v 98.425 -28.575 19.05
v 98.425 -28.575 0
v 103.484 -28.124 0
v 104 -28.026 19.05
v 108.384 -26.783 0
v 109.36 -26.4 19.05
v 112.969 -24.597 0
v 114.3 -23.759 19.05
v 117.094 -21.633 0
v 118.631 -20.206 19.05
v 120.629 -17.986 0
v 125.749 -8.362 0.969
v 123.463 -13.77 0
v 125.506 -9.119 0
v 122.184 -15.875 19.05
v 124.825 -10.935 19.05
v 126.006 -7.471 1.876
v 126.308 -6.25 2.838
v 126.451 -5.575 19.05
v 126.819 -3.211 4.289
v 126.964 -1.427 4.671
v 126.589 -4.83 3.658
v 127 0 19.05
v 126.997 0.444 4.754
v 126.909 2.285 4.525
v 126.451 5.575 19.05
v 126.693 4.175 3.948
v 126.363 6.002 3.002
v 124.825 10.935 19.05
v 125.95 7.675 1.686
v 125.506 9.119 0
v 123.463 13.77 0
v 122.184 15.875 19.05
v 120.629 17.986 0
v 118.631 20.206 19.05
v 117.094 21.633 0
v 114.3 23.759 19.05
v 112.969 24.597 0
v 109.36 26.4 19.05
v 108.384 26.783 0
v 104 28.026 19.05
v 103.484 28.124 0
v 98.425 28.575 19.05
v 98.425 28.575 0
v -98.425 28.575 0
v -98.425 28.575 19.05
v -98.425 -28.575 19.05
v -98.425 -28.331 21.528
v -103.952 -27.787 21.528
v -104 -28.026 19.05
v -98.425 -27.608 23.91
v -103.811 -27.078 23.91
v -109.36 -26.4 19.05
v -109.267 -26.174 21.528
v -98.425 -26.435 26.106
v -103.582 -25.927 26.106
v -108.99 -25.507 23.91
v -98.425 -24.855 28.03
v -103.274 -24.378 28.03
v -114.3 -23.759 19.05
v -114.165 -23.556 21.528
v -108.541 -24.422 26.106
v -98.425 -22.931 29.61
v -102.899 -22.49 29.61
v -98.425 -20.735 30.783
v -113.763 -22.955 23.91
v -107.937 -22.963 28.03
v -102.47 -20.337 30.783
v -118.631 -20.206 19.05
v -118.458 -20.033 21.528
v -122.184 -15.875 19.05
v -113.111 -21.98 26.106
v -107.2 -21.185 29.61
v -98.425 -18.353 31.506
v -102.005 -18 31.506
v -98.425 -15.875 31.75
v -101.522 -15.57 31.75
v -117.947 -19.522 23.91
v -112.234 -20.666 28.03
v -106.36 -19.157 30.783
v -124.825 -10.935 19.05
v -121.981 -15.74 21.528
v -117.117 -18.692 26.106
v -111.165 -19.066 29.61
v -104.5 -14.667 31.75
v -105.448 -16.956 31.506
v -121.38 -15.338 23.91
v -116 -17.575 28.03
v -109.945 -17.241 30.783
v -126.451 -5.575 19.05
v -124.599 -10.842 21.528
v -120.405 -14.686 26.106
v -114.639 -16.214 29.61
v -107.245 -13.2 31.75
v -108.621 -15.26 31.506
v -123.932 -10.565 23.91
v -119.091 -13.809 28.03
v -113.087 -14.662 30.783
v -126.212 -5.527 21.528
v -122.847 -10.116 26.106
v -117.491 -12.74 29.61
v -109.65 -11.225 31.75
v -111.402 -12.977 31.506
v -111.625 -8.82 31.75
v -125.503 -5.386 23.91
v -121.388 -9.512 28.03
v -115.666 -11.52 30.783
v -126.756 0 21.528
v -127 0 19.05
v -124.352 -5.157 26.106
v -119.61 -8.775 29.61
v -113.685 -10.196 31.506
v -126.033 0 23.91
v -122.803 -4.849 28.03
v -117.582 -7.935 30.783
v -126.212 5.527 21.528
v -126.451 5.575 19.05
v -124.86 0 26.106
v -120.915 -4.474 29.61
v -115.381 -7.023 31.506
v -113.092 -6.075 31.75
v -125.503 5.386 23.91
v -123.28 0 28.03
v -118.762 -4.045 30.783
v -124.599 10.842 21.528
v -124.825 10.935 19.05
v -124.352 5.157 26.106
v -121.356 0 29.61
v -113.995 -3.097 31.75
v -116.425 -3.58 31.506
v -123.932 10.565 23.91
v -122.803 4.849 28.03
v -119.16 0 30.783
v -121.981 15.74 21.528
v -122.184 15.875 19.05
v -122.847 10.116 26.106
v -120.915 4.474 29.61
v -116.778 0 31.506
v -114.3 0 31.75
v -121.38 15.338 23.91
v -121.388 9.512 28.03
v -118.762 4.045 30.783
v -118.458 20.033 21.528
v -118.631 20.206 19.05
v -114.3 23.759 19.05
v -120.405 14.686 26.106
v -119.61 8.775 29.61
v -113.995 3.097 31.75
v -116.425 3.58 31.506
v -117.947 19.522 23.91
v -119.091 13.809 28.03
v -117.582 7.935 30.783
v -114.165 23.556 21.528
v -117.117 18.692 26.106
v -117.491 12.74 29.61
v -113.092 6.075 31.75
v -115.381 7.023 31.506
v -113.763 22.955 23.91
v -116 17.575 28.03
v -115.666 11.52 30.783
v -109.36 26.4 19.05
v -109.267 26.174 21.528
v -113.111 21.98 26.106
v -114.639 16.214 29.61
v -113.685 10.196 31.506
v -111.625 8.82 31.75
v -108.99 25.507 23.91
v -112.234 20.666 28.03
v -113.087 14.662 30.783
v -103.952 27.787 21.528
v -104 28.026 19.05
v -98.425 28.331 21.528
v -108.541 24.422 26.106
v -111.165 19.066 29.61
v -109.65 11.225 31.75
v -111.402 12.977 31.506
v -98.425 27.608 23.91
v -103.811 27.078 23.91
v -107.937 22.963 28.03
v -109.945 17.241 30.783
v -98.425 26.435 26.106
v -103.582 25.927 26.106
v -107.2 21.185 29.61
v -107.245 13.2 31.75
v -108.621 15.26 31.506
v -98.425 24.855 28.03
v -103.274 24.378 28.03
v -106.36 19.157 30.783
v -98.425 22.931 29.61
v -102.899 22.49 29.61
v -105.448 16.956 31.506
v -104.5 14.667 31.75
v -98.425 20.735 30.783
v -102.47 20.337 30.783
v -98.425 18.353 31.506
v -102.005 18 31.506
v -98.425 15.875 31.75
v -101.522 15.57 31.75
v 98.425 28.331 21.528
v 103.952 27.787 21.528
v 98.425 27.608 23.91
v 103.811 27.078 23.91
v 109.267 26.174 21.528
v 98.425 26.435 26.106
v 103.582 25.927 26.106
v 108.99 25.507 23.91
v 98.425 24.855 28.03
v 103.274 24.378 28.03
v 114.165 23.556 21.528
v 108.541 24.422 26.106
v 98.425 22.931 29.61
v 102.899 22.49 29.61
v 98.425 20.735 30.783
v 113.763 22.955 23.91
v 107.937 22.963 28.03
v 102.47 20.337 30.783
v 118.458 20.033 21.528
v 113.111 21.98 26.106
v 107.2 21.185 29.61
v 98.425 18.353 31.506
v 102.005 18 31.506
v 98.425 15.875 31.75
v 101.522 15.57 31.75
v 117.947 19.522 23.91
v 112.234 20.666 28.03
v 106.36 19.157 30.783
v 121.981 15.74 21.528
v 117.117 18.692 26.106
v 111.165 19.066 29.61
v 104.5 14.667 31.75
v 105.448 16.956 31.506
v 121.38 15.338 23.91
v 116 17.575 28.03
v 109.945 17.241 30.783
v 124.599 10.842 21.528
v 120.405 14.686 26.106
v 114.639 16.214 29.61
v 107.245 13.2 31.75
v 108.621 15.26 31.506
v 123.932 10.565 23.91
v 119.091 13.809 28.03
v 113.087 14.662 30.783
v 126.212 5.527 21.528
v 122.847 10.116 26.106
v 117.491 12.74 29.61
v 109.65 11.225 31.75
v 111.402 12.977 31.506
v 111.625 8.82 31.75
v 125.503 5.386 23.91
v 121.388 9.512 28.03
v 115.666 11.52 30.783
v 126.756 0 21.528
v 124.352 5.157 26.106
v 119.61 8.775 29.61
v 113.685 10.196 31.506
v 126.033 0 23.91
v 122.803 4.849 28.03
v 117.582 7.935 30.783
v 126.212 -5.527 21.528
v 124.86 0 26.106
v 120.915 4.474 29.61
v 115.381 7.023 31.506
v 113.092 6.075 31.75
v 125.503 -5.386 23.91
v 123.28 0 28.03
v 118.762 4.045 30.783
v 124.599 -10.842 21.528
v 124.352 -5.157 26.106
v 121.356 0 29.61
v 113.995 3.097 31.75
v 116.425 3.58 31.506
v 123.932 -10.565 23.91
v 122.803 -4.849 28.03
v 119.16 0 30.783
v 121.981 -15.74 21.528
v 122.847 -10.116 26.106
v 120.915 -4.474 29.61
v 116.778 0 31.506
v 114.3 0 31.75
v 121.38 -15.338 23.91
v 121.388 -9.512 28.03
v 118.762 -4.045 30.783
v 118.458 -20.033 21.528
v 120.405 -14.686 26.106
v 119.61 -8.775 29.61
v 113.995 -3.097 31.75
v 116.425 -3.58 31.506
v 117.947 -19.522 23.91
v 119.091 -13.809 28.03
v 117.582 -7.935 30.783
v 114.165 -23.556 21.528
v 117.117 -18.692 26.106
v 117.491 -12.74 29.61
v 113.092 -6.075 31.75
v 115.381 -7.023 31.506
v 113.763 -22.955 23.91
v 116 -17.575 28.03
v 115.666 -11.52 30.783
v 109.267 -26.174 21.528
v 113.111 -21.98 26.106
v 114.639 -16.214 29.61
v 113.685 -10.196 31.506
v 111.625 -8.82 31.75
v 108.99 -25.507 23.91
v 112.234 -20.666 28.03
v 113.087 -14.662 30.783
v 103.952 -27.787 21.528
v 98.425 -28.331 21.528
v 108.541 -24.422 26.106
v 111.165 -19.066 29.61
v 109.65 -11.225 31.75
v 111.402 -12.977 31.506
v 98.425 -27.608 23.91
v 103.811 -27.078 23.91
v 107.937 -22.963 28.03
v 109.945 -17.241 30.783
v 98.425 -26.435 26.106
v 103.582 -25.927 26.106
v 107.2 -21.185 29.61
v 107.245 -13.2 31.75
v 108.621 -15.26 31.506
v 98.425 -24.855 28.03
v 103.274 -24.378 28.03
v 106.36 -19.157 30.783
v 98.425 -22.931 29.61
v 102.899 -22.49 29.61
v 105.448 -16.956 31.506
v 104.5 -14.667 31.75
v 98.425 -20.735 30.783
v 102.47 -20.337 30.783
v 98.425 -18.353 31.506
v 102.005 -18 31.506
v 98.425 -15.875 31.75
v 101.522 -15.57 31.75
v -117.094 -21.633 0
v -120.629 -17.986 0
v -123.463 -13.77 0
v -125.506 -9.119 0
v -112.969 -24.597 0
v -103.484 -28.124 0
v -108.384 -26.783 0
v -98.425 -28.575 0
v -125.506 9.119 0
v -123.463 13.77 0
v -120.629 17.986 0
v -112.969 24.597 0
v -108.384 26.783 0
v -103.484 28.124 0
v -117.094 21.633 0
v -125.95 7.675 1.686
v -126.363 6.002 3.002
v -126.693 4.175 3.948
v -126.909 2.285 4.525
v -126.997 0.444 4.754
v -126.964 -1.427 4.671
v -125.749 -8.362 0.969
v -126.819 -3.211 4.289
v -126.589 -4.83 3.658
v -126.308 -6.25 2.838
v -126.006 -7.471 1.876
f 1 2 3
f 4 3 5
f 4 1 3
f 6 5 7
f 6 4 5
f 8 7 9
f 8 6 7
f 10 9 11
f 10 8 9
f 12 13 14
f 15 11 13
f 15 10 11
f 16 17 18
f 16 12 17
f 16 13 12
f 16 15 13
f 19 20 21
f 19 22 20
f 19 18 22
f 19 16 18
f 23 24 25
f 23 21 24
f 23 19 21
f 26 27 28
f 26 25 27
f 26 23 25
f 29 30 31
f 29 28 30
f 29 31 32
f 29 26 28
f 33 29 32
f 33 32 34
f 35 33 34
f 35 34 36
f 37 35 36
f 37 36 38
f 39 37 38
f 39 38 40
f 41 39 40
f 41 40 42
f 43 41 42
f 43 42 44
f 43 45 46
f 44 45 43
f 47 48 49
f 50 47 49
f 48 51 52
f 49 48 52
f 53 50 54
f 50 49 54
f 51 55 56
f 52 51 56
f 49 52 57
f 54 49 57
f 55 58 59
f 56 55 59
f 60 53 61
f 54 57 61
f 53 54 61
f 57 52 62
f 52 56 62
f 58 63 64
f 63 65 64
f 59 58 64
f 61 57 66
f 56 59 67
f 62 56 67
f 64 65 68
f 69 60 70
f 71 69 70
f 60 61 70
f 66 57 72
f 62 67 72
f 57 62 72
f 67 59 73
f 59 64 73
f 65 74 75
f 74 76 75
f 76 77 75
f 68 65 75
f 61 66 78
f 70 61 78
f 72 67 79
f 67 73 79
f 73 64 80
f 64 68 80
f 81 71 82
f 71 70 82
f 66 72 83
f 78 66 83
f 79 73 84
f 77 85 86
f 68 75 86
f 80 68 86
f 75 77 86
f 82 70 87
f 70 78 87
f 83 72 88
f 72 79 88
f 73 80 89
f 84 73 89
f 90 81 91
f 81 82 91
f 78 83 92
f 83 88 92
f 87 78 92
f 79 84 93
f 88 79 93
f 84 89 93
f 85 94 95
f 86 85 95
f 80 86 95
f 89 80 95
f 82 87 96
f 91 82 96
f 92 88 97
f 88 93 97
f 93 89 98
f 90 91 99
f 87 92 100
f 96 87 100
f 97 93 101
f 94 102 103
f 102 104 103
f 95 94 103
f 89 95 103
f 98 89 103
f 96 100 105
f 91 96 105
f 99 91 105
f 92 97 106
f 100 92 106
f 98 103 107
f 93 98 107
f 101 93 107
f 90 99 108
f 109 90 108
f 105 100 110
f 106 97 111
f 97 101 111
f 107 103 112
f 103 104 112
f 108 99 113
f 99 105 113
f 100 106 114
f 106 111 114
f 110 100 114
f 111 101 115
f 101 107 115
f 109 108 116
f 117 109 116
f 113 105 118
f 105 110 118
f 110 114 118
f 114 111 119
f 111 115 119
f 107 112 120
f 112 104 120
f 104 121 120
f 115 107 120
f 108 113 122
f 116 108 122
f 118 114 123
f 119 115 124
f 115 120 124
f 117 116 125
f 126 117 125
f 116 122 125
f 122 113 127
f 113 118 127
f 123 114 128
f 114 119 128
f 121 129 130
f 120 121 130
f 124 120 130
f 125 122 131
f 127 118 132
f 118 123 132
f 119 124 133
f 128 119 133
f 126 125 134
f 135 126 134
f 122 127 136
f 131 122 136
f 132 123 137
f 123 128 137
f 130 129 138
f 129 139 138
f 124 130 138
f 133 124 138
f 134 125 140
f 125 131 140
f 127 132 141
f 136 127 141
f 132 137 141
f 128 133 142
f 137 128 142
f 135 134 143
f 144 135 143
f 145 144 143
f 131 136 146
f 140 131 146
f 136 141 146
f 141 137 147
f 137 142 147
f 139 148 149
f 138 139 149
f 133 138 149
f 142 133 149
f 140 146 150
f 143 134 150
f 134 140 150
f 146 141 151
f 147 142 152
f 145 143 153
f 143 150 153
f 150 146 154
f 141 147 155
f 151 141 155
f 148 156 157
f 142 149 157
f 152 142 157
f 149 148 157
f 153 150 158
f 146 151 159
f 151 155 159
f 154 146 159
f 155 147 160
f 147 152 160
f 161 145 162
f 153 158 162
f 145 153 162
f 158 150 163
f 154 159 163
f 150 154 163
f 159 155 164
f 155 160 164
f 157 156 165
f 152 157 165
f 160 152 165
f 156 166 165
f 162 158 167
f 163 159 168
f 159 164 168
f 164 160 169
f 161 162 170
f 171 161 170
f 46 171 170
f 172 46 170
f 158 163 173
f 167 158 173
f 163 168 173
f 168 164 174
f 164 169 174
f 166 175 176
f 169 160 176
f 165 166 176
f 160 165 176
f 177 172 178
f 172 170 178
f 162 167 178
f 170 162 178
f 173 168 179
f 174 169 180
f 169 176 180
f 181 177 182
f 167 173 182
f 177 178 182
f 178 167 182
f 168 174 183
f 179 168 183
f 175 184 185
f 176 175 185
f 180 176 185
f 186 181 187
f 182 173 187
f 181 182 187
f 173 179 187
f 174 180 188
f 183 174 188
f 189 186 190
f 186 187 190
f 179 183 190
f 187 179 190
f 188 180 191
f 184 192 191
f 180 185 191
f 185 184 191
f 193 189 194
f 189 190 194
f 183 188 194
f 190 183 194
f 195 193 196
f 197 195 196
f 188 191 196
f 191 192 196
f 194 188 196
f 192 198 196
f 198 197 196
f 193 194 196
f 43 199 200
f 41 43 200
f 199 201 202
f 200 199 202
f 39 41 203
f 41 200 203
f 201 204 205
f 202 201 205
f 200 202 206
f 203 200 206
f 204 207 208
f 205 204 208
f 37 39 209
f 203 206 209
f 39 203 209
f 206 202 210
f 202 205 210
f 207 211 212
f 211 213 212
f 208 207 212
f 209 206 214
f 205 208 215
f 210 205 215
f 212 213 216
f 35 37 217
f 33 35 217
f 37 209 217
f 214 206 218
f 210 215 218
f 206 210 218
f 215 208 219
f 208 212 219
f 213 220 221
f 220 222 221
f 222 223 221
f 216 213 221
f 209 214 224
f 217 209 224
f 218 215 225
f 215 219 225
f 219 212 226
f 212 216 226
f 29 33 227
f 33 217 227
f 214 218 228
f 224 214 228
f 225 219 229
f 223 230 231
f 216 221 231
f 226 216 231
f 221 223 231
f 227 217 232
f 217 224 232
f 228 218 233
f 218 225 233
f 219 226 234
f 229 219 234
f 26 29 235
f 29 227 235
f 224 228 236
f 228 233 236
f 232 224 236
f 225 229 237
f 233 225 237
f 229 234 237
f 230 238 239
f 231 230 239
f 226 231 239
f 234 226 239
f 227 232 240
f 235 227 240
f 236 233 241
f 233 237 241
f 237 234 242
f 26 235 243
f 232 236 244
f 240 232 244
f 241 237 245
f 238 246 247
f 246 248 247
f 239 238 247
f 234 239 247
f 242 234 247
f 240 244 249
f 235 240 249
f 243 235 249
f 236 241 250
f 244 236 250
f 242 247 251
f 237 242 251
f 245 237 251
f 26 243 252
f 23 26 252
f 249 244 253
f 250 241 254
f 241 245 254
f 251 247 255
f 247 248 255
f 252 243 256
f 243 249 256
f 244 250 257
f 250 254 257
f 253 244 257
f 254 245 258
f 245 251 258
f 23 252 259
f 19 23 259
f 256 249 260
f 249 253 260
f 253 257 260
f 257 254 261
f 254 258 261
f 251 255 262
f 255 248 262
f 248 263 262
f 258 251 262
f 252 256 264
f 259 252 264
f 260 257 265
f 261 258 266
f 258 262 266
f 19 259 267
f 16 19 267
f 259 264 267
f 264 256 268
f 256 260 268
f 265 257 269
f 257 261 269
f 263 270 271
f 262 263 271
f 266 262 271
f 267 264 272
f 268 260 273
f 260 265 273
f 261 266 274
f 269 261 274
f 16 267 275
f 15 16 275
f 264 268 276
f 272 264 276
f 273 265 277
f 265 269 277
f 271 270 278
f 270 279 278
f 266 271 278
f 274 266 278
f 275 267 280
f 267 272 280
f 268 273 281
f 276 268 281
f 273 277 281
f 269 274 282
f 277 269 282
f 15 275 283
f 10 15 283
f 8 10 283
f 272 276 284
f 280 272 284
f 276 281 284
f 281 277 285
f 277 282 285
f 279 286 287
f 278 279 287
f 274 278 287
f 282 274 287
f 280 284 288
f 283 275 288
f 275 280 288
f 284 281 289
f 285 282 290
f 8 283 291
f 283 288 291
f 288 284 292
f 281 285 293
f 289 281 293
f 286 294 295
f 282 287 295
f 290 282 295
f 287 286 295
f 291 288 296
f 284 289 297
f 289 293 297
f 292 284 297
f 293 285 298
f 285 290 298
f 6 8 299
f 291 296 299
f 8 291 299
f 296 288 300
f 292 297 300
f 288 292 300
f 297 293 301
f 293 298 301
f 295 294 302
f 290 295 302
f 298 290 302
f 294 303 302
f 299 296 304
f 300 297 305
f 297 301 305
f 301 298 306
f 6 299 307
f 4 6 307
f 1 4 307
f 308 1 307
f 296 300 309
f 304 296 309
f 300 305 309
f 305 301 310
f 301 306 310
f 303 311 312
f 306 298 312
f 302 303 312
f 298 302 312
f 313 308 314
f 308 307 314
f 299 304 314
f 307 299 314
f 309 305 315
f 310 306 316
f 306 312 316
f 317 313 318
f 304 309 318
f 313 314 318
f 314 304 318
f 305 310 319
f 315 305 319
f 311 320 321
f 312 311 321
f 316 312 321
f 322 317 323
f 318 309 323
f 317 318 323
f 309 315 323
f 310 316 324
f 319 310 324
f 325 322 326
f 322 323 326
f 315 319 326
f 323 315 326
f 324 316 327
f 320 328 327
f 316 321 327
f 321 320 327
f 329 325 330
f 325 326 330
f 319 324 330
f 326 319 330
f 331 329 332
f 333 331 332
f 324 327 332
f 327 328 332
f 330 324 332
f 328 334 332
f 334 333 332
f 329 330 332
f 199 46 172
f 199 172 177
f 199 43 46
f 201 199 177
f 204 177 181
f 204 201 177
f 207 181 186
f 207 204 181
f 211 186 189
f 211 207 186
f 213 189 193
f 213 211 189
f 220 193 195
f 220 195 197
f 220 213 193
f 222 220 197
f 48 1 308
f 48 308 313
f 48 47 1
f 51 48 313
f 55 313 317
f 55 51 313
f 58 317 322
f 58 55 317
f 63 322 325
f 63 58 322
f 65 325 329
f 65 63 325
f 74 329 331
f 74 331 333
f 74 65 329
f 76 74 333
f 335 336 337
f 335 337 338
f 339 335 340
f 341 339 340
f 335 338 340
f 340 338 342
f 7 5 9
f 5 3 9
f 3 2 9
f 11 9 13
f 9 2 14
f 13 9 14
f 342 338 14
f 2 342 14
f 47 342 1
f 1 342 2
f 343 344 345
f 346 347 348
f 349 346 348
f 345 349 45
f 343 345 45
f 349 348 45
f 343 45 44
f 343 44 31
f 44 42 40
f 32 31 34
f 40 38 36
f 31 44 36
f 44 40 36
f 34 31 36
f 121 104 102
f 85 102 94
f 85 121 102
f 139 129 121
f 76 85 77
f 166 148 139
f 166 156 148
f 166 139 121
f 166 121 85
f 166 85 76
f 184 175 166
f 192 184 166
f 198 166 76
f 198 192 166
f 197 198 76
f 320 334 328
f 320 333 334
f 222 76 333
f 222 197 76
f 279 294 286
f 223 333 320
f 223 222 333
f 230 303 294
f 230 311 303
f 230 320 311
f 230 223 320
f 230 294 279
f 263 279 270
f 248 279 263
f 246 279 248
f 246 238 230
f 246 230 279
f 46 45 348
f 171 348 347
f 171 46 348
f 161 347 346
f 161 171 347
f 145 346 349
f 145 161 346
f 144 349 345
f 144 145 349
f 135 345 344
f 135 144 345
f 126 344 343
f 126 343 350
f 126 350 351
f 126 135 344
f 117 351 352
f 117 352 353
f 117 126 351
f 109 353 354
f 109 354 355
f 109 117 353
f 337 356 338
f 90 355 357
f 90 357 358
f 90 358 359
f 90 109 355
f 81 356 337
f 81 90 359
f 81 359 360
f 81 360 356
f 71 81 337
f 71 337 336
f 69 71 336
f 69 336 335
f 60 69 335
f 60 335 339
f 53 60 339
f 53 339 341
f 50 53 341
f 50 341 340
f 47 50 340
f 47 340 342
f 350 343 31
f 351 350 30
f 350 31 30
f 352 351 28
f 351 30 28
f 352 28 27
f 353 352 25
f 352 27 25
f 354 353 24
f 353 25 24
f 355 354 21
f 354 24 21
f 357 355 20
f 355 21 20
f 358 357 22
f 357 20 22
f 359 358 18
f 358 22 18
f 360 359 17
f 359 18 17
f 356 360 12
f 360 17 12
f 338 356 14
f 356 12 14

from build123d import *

# Parameters (mm, degrees)
SKETCH_W             = 254
SKETCH_H             = 57.15
PAD_DEPTH            = 31.75
POCKET_DEPTH         = 31.751
FILLET_R             = 12.7
SKETCH002_R          = 11.1125
POCKET001_DEPTH      = 127.001
POCKET001_DEPTH_BACK = -127.001


with BuildPart() as part:
    # Sketch → Pad (new body)
    with BuildSketch(Plane.XY):
        Rectangle(SKETCH_W, SKETCH_H)
    extrude(amount=PAD_DEPTH)

    # Sketch001 (on Face6 of Pad) → Pocket (cut, through all)
    with BuildSketch(Plane.XY.offset(31.75)):
        with BuildLine():
            ThreePointArc((-98.425, 28.575), (-127, 0), (-98.425, -28.575))
            Line((-98.425, -28.575), (-145.596313, -28.575))
            Line((-145.596313, 28.575), (-145.596313, -28.575))
            Line((-98.425, 28.575), (-145.596313, 28.575))
        make_face()
        with BuildLine():
            ThreePointArc((98.425, -28.575), (127, 0), (98.425, 28.575))
            Line((98.425, 28.575), (145.596313, 28.575))
            Line((145.596313, 28.575), (145.596313, -28.575))
            Line((98.425, -28.575), (145.596313, -28.575))
        make_face()
    extrude(amount=-POCKET_DEPTH, mode=Mode.SUBTRACT)

    # Fillet
    fillet_edges = [part.edges().sort_by_distance(p)[0] for p in [
        (-118.630576, -20.205576, 31.75),
        (-118.630576, 20.205576, 31.75),
        (0, 28.575, 31.75),
        (118.630576, 20.205576, 31.75),
        (118.630576, -20.205576, 31.75),
        (0, -28.575, 31.75),
    ]]
    fillet(fillet_edges, radius=FILLET_R)

    # Sketch002 → Pocket001 (cut, two sides)
    with BuildSketch(Plane.YZ) as pocket001_sk:
        with Locations((0, -6.35)):
            Circle(SKETCH002_R)
    extrude(amount=-POCKET001_DEPTH, mode=Mode.SUBTRACT)
    extrude(pocket001_sk.sketch, amount=-POCKET001_DEPTH_BACK, mode=Mode.SUBTRACT)


solid = part.part
